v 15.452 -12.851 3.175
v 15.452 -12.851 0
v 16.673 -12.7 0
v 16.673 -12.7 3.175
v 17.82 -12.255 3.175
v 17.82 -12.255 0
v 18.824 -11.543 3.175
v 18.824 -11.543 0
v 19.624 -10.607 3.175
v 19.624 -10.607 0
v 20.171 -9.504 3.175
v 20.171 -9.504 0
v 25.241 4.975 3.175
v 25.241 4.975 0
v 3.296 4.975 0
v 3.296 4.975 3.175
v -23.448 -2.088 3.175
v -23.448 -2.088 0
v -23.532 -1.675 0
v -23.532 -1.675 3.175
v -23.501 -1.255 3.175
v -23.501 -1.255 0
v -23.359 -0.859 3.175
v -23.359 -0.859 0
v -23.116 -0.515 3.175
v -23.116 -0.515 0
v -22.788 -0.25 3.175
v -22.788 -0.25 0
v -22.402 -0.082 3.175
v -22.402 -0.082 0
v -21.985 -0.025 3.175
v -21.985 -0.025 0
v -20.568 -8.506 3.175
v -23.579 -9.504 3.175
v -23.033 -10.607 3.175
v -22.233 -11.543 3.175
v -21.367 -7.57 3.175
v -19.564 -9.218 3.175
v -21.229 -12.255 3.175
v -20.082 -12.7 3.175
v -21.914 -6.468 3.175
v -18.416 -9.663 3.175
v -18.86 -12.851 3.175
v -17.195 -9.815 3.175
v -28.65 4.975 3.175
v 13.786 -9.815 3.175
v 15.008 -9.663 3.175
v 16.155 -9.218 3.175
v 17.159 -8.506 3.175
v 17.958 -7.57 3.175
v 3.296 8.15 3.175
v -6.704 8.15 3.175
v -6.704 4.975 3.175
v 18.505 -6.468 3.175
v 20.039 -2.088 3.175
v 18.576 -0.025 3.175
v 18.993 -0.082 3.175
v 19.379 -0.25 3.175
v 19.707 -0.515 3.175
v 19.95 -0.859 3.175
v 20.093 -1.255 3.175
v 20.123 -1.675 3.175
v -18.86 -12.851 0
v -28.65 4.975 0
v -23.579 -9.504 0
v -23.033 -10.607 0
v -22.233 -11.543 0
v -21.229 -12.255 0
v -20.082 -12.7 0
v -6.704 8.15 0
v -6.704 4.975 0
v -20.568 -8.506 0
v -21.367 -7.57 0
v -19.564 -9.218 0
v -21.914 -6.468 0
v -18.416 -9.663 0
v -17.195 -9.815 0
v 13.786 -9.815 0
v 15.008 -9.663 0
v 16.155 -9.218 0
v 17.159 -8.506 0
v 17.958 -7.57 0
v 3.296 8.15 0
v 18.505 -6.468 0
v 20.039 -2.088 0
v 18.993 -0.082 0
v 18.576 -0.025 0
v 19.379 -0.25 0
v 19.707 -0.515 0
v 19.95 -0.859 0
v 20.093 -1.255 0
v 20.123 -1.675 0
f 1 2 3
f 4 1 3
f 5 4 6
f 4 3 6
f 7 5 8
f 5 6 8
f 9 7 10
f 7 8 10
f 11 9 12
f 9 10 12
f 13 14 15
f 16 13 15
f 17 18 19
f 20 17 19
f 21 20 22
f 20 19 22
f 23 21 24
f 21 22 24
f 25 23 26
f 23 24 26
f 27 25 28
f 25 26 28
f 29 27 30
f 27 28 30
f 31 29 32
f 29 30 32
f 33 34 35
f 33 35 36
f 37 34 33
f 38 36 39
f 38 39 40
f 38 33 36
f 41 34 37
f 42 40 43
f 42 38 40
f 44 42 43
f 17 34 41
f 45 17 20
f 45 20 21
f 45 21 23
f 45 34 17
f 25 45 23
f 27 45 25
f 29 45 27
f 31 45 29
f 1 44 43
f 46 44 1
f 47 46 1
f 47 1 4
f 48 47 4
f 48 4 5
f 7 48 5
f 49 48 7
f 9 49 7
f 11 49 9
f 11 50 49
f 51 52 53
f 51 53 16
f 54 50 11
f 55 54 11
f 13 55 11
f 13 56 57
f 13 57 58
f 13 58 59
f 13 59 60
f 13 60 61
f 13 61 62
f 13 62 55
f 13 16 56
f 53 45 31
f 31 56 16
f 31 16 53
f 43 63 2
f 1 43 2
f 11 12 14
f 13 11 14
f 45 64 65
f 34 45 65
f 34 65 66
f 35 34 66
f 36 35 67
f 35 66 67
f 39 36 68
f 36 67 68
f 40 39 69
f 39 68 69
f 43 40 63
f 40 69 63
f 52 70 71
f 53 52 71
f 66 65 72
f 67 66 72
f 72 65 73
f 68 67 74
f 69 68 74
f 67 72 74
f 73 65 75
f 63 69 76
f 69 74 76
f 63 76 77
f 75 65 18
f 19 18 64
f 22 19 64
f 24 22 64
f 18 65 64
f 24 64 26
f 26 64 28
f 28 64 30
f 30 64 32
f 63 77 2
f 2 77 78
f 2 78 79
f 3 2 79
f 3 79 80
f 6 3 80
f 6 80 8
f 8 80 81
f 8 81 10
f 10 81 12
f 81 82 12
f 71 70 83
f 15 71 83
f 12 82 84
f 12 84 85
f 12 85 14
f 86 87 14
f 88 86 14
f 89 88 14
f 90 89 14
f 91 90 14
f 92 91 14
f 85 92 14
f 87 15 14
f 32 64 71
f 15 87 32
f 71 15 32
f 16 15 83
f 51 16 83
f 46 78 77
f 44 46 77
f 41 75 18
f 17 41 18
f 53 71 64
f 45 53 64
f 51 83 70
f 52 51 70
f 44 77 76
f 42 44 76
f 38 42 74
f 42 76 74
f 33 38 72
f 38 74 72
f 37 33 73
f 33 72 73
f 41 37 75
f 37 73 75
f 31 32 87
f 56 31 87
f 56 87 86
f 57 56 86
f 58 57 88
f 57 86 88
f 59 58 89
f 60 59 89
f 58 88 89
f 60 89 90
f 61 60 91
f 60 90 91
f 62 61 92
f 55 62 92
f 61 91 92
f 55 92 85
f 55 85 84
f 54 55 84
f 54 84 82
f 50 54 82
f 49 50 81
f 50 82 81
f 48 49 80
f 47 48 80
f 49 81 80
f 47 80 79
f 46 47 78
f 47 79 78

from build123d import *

# Parameters (mm, degrees)
F1_DEPTH = 3.175


with BuildPart() as f1:
    # F0 (on Top) → F1 (new body)
    with BuildSketch(Plane.XY):
        with BuildLine():
            Line((25.241197, 4.974793), (3.295561, 4.974793))
            Line((3.295561, 4.974793), (3.295561, 8.149793))
            Line((3.295561, 8.149793), (-1.704439, 8.149793))
            Line((-1.704439, 8.149793), (-6.704439, 8.149793))
            Line((-6.704439, 8.149793), (-6.704439, 4.974793))
            Line((-6.704439, 4.974793), (-28.650075, 4.974793))
            Line((-28.650075, 4.974793), (-23.579421, -9.504047))
            ThreePointArc((-23.579421, -9.504047), (-21.753258, -11.929592), (-18.86044, -12.851406))
            Line((-18.86044, -12.851406), (-1.704439, -12.851406))
            Line((-1.704439, -12.851406), (15.451562, -12.851406))
            ThreePointArc((15.451562, -12.851406), (18.34438, -11.929592), (20.170542, -9.504047))
            Line((20.170542, -9.504047), (25.241197, 4.974793))
        make_face()
        with BuildLine():
            ThreePointArc((18.575678, -0.025208), (19.840188, -0.678574), (20.038877, -2.08797))
            Line((20.038877, -2.08797), (18.505102, -6.467537))
            ThreePointArc((18.505102, -6.467537), (16.67894, -8.893082), (13.786122, -9.814896))
            Line((13.786122, -9.814896), (-17.195, -9.814896))
            ThreePointArc((-17.195, -9.814896), (-20.087818, -8.893082), (-21.913981, -6.467537))
            Line((-21.913981, -6.467537), (-23.447755, -2.08797))
            ThreePointArc((-23.447755, -2.08797), (-23.249066, -0.678574), (-21.984557, -0.025208))
            Line((-21.984557, -0.025208), (18.575678, -0.025208))
        make_face(mode=Mode.SUBTRACT)
    extrude(amount=F1_DEPTH)


solid = f1.part
